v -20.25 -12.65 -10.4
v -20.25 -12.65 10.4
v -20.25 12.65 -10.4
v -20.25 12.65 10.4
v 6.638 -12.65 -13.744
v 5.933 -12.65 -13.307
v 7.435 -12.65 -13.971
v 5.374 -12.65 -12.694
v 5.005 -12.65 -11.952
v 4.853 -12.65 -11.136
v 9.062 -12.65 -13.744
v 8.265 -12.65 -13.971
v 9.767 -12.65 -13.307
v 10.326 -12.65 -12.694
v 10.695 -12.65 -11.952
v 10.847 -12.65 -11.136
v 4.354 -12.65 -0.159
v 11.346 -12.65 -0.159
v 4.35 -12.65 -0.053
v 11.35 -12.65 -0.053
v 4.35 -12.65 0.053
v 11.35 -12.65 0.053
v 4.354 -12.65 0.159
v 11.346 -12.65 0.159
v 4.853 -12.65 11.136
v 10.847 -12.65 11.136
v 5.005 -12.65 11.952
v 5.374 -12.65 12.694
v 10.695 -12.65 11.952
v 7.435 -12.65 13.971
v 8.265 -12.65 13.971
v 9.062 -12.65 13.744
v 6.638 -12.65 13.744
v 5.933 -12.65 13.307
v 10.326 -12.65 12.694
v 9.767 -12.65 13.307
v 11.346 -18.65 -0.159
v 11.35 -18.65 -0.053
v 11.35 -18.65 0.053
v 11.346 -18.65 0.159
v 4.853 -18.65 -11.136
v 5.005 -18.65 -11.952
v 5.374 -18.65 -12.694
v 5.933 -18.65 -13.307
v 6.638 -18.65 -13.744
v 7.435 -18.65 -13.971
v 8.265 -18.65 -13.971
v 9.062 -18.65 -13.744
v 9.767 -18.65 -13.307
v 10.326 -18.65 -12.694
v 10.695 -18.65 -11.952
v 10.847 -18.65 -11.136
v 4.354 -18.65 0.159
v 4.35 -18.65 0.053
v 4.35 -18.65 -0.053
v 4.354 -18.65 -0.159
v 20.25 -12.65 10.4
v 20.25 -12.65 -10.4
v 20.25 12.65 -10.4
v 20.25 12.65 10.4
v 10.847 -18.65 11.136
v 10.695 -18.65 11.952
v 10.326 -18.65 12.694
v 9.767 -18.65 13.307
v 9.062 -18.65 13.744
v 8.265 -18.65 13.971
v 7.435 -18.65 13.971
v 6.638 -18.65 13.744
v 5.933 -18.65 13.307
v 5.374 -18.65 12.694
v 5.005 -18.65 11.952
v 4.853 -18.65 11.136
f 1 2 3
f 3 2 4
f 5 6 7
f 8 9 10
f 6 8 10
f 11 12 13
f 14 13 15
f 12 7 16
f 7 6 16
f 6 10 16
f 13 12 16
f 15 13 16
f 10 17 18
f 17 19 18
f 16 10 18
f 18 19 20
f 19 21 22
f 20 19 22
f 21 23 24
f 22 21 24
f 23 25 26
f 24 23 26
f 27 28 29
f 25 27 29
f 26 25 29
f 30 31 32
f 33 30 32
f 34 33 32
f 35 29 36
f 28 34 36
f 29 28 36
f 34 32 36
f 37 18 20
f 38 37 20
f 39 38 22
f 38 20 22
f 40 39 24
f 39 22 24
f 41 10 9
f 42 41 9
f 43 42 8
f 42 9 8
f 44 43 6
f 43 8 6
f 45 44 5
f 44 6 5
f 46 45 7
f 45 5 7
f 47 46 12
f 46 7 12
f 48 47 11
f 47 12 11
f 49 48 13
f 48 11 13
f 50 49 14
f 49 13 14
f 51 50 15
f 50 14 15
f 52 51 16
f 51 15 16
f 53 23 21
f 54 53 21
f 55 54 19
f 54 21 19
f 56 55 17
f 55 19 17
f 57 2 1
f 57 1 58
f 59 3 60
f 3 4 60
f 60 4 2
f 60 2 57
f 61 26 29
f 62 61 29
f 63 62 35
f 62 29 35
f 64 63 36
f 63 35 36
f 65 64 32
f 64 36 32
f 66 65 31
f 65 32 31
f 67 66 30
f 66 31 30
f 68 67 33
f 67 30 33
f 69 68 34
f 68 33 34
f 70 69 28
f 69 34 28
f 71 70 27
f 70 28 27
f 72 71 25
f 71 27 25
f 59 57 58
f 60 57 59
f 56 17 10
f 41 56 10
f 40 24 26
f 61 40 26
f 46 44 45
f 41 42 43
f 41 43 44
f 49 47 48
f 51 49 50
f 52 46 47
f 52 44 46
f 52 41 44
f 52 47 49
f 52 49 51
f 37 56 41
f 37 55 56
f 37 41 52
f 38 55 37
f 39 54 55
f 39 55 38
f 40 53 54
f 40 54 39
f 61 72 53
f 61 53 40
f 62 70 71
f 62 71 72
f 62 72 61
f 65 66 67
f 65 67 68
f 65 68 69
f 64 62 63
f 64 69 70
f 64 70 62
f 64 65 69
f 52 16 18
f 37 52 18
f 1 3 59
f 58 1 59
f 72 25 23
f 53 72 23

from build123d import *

# Parameters (mm, degrees)
SKETCH1_W           = 40.5
SKETCH1_H           = 25.3
BOSS_EXTRUDE1_DEPTH = 10.4
BOSS_EXTRUDE2_DEPTH = 6


with BuildPart() as part:
    # Sketch1 → Boss-Extrude1 (new, symmetric)
    with BuildSketch(Plane.XY):
        Rectangle(SKETCH1_W, SKETCH1_H)
    extrude(amount=BOSS_EXTRUDE1_DEPTH, both=True)


with BuildPart() as body_2:
    # Sketch3 → Boss-Extrude2 (new body)
    with BuildSketch(Plane.XZ.offset(12.65)):
        with BuildLine():
            Line((4.353617572, -0.159090909), (4.853100776, -11.136363636))
            ThreePointArc((4.853100776, -11.136363636), (7.85, -14), (10.846899224, -11.136363636))
            Line((10.846899224, -11.136363636), (11.346382428, -0.159090909))
            ThreePointArc((11.346382428, -0.159090909), (11.35, 0), (11.346382428, 0.159090909))
            Line((11.346382428, 0.159090909), (10.846899224, 11.136363636))
            ThreePointArc((10.846899224, 11.136363636), (7.85, 14), (4.853100776, 11.136363636))
            Line((4.853100776, 11.136363636), (4.353617572, 0.159090909))
            ThreePointArc((4.353617572, 0.159090909), (4.35, 0), (4.353617572, -0.159090909))
        make_face()
    extrude(amount=BOSS_EXTRUDE2_DEPTH)


solid = Compound([part.part, body_2.part])
